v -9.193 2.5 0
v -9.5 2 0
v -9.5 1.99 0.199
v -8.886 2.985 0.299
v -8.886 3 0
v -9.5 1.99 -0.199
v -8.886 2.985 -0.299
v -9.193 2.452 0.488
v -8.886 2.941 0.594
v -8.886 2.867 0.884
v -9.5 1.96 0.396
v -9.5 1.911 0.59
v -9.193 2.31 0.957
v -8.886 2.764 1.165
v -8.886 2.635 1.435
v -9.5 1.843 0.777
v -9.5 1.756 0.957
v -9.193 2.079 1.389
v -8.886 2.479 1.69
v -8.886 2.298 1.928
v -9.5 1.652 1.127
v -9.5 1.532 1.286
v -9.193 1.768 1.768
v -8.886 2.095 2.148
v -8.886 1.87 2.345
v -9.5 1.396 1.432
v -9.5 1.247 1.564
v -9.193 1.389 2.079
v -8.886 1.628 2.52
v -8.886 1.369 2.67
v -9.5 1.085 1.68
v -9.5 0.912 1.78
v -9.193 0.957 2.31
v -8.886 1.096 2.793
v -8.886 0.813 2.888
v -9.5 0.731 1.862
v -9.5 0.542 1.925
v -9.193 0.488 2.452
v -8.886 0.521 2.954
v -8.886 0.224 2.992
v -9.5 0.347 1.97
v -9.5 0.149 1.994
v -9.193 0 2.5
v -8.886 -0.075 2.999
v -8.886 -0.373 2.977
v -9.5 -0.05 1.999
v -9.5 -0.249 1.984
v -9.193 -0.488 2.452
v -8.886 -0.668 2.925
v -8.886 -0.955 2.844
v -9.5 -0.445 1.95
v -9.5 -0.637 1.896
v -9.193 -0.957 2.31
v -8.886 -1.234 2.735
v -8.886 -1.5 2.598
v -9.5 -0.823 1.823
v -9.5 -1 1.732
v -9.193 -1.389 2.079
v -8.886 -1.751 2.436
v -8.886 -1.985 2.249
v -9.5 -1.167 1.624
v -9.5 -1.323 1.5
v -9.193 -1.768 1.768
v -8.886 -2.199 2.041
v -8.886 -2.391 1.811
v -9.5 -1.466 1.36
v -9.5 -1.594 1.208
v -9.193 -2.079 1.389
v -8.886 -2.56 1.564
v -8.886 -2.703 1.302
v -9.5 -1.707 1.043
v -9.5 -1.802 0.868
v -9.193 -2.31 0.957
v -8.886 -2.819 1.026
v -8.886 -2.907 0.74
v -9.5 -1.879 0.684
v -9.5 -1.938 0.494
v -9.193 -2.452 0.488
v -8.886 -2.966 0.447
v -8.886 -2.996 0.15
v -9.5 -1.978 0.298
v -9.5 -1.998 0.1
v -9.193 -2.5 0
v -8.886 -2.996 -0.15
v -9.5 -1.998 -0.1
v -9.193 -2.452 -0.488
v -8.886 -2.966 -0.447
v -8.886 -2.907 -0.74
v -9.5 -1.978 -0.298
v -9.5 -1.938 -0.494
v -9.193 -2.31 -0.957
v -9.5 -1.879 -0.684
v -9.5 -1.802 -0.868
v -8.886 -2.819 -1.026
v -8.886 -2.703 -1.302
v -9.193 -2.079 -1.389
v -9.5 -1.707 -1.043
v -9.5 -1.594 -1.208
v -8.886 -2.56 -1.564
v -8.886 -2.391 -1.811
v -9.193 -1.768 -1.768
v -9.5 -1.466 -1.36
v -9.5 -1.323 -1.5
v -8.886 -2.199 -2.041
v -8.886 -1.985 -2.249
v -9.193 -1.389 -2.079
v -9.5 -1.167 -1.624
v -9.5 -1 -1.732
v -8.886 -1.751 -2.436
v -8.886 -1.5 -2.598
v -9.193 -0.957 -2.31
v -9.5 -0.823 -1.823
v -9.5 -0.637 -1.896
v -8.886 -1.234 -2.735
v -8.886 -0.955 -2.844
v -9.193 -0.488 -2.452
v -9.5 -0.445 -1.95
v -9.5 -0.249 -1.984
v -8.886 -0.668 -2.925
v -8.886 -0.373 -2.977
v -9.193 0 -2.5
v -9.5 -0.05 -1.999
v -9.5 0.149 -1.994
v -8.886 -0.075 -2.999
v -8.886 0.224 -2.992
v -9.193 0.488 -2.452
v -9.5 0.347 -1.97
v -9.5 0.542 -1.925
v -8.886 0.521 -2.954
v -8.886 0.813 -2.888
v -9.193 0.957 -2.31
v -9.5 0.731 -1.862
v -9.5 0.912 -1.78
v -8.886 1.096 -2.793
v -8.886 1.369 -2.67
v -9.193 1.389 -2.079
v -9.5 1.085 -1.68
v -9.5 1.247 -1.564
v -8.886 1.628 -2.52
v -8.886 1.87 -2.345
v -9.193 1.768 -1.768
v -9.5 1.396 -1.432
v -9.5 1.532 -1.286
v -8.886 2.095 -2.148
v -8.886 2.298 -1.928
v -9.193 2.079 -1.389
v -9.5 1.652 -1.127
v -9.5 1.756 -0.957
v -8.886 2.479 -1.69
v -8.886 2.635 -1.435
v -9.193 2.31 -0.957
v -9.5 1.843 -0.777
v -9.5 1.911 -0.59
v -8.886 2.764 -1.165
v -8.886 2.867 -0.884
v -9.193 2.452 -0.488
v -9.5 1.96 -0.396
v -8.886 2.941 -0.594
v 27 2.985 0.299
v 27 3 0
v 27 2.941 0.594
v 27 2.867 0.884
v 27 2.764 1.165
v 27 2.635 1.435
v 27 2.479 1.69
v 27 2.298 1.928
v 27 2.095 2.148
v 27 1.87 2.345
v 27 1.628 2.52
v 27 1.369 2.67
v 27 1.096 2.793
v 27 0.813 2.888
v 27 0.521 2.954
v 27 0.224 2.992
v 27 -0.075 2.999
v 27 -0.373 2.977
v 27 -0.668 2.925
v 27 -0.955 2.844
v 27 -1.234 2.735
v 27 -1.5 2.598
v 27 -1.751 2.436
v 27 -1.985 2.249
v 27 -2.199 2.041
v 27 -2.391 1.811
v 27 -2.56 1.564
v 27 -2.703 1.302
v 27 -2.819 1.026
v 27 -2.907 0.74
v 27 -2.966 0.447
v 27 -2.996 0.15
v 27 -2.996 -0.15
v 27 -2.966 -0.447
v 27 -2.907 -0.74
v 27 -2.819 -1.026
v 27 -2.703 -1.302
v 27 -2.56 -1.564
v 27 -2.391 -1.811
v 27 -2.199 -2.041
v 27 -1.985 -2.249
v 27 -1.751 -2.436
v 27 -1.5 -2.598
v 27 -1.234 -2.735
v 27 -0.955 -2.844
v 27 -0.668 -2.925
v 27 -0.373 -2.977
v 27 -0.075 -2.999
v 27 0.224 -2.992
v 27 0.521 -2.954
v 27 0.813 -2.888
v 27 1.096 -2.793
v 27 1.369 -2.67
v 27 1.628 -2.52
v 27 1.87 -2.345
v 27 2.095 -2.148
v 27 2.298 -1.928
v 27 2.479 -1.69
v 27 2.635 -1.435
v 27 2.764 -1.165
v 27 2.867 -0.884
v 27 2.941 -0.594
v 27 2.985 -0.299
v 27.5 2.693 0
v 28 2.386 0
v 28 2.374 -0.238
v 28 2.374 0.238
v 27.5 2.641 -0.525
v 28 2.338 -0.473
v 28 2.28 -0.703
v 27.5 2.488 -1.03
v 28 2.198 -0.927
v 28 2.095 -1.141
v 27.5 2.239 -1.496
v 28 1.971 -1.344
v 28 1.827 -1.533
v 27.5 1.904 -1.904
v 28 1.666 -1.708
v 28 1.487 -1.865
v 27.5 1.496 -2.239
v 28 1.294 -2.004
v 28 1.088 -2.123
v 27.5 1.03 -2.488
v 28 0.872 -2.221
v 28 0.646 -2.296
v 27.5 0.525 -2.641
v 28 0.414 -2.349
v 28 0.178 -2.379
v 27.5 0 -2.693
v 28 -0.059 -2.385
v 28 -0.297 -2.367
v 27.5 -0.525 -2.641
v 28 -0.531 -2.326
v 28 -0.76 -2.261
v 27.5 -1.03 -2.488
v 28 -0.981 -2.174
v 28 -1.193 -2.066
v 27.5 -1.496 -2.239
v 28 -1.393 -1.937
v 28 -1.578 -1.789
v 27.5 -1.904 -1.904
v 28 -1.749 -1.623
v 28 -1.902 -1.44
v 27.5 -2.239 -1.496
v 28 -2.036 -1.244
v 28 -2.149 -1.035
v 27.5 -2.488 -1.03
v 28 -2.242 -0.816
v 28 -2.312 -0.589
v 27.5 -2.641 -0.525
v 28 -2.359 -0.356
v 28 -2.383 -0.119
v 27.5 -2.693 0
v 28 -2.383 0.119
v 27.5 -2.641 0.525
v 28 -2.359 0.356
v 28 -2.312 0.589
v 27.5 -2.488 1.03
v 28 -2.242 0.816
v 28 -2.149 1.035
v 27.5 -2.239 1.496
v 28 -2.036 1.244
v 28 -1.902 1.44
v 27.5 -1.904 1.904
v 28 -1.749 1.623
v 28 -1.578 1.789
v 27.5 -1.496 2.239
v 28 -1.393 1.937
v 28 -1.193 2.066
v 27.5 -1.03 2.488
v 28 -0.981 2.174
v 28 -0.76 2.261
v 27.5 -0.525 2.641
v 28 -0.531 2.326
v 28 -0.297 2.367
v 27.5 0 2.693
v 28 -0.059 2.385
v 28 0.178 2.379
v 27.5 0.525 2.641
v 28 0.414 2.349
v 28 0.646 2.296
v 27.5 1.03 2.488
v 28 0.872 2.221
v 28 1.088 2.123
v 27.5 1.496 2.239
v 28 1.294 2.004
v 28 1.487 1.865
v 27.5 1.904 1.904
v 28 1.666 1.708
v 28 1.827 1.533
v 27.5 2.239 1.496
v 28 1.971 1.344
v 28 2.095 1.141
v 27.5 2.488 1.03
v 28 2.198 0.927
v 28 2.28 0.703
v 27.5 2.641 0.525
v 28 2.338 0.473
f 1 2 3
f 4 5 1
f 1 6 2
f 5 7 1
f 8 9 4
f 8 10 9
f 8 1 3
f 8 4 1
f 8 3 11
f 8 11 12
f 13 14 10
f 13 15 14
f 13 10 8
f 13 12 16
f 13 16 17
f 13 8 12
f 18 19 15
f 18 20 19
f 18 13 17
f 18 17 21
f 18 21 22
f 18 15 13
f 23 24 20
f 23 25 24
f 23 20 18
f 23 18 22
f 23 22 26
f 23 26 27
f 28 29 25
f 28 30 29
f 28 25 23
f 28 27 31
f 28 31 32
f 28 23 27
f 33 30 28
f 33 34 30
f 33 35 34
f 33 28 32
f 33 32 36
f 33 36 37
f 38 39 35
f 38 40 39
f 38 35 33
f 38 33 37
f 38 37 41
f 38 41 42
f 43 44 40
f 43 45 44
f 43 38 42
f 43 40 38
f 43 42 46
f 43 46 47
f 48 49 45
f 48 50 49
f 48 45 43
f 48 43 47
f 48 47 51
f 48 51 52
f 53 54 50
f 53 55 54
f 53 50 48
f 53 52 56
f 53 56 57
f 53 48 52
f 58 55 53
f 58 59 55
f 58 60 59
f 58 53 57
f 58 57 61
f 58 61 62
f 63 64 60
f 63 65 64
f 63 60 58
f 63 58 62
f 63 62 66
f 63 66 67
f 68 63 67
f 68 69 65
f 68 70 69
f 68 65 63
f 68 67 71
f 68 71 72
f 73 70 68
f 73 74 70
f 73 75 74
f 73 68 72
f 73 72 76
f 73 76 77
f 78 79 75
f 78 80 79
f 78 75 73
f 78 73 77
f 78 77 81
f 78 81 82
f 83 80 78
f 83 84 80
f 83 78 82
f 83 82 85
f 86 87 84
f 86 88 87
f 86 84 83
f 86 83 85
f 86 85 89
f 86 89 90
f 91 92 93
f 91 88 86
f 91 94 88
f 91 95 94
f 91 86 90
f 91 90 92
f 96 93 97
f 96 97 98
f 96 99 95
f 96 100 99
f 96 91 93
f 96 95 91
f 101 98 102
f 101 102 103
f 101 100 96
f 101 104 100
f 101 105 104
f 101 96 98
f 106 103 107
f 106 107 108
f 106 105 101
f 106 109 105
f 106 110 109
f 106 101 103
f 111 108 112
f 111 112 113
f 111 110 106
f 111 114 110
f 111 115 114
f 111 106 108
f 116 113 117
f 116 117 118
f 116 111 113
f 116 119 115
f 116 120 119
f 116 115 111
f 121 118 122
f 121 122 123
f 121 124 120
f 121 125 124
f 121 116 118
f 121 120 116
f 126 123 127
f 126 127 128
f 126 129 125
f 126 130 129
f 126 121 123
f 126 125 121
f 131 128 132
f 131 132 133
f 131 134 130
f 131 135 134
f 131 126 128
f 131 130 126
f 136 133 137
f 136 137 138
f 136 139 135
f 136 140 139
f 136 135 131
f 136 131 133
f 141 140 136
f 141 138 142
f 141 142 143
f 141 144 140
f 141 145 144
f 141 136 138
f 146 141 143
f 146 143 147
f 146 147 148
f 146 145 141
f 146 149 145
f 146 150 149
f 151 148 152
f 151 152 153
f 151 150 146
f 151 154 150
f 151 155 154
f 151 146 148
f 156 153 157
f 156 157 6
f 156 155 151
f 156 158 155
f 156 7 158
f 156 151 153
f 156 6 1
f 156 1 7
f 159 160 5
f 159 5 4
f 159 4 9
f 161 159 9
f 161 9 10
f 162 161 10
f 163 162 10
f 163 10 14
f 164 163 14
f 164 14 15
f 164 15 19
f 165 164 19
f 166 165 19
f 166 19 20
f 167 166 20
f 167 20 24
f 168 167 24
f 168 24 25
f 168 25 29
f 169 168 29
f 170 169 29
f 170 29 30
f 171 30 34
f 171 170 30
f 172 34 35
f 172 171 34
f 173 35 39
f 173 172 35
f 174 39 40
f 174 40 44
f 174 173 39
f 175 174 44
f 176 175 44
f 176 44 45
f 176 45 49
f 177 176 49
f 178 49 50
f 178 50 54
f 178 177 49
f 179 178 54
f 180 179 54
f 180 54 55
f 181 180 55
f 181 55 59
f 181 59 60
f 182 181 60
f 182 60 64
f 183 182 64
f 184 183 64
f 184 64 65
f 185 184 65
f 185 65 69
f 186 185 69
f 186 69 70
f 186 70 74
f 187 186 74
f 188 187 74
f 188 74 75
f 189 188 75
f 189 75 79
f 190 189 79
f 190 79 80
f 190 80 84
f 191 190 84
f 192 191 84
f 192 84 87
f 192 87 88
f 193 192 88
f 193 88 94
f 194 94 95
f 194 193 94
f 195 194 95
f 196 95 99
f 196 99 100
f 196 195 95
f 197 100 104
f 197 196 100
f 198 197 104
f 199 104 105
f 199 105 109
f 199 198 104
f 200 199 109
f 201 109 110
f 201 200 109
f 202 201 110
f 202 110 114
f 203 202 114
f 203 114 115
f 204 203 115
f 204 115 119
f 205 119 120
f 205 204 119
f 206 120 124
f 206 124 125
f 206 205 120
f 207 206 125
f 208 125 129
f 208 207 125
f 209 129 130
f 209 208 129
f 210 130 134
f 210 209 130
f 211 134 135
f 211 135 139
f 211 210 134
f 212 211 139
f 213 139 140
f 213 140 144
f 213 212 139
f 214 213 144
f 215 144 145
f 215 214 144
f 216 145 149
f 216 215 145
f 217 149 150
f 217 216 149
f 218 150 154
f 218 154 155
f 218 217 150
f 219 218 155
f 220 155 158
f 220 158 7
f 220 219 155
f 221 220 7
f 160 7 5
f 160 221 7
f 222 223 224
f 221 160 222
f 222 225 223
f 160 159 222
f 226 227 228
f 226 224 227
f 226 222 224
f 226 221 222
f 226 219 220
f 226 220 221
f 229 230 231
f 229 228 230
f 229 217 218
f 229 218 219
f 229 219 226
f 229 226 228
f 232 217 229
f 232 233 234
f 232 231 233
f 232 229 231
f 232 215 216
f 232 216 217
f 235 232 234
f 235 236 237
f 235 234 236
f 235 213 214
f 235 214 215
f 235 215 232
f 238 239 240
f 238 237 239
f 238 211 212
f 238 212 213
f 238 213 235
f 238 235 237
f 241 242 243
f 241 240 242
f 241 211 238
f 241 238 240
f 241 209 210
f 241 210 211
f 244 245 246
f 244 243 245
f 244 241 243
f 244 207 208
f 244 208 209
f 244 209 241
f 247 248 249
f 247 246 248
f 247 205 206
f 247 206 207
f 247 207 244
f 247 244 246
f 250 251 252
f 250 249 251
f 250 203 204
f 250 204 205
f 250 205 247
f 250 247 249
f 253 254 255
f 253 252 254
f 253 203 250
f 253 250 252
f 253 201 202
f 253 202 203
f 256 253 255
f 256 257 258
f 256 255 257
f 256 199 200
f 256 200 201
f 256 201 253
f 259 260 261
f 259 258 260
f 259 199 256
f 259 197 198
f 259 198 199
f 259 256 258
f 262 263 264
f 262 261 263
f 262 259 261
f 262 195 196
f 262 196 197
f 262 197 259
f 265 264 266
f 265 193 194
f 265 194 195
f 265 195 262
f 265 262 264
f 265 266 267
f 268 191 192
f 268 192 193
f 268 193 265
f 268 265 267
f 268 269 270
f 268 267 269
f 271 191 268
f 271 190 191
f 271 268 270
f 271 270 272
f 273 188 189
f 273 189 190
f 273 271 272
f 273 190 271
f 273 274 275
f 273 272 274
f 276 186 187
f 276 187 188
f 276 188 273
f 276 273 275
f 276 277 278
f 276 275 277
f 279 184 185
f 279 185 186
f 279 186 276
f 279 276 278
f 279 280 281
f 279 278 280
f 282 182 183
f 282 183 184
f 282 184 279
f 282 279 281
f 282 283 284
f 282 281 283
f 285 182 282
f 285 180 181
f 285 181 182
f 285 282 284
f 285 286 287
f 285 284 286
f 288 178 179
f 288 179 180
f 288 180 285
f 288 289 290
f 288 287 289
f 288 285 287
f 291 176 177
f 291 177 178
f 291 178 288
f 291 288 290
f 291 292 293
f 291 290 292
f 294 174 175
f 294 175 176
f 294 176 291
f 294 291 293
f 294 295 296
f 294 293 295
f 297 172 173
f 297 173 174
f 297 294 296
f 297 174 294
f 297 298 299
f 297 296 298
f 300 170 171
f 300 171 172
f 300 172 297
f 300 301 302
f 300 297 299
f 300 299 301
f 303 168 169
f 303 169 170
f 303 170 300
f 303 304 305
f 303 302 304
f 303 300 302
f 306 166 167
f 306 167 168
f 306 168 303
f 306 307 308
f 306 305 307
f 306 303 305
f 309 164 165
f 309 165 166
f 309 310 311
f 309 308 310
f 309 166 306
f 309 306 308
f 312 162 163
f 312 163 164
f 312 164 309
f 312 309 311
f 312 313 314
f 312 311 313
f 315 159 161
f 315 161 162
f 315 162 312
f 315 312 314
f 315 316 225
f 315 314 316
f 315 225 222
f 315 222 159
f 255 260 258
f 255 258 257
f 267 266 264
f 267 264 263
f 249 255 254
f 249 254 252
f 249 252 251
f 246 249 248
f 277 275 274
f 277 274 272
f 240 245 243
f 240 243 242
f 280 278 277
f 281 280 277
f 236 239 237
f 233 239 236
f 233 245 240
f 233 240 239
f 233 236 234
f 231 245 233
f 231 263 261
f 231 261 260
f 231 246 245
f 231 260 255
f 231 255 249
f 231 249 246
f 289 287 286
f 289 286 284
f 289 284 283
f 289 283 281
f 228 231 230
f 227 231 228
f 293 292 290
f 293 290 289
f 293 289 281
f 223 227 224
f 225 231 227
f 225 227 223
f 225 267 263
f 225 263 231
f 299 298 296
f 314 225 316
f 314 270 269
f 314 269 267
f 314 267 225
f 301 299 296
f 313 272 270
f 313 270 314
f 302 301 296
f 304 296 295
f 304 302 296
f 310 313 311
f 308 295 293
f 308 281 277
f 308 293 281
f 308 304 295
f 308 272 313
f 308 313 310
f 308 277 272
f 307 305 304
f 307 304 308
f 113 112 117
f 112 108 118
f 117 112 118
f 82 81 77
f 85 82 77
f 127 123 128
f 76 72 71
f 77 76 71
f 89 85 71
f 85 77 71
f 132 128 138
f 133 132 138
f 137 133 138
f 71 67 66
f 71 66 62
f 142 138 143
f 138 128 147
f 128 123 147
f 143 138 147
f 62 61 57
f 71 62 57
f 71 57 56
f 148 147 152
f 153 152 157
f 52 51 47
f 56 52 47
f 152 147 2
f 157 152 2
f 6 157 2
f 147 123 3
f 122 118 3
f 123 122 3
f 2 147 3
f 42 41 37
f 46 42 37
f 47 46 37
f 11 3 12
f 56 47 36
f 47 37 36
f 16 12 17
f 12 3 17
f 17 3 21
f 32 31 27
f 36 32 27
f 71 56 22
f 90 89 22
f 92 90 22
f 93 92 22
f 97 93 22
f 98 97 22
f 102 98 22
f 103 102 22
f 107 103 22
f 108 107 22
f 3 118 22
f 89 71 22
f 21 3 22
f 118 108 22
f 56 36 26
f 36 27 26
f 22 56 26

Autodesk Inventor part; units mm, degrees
ref_plane "YZ Plane" through (0, 0, 0) normal (1, 0, 0) x (0, 1, 0)
ref_plane "XZ Plane" through (0, 0, 0) normal (0, 1, 0) x (-1, 0, 0)
sketch "Szkic1" plane through (0, 0, 0) normal (0, 0, 1) x (1, 0, 0)
  line L0 (28, 3) -> (28, 0)
  line L1 (-9.5, 0) -> (28, 0)
  line L2 (-17, 0) -> (35.5, 0) projected
  line L3 (0, 3.6) -> (0, -0.6) projected
  line L4 (-9.5, 3) -> (-9.5, 0)
  line L5 (10, 3) -> (10, 0) construction
  line L6 (-17, 0) -> (35.5, 0) projected
  line L7 (-9.5, 3) -> (28, 3)
  dimension "d4" = 9.5
  dimension "d5" = 28
  dimension "d6" = 18
  dimension "d13" = 6
revolve "Bryła" add sketch "Szkic1" angle 360 about axis through (-9.5, 0, 0) along (1, 0, 0)
thread "Gwint1" size "M6x1" class "6g" standard "ISO Metric profile" length 9.5
thread "Gwint2" size "M6x1" class "6g" standard "ISO Metric profile" length 18.6135
chamfer "Faza1" distance 0.6145 distance2 1 1 edges at (28, -3, 0) measured on face at (28, 1.0659, 1.0214)
chamfer "Faza2" distance 0.6145 distance2 1 1 edges at (-9.5, -3, 0) measured on face at (14.8333, 2.9612, -0.4812)
ref_plane "Work Plane1" through (2.75, 0, 0) normal (0, -1, 0) x (1, 0, 0)
equation "\"d4\" = KOH"
equation "\"d5\" = NLG"
equation "\"d6\" = GEL"
equation "\"d13\" = GD"
equation "\"d1\" = KOH"
equation "\"d7\" = GEL + GAL"
equation "\"d10\" = -0.5 * SPD + 0.5 * GD"
equation "\"d12\" = -0.5 * SPD + 0.5 * GD"
equation "\"NLG\" = 28"
equation "\"GEL\" = 18"
equation "\"GAL\" = 0.61345 * PTC"
equation "\"SPD\" = 4"
equation "\"d0\" = GD"
equation "\"GUL\" = 0.61345 * PTC"
equation "\"KOH\" = 9.5"
equation "\"GD\" = 6"
equation "\"BDM\" = NND"
equation "\"GUL1\" = GUL"
equation "\"GAL1\" = GAL"
equation "\"d80\" = -GUL - GEL"
equation "\"d86\" = -KOH + GUL1"
equation "\"PTC\" = 1"
equation "\"THREADDIA\" = 6"
equation "\"TOA\" = 30deg"
equation "\"NND\" = 6"
equation "\"GD1\" = THREADDIA - 1.2269 * PTC"
properties part number "DIN 835 - M6 x 28" material "Stal, miękka"
